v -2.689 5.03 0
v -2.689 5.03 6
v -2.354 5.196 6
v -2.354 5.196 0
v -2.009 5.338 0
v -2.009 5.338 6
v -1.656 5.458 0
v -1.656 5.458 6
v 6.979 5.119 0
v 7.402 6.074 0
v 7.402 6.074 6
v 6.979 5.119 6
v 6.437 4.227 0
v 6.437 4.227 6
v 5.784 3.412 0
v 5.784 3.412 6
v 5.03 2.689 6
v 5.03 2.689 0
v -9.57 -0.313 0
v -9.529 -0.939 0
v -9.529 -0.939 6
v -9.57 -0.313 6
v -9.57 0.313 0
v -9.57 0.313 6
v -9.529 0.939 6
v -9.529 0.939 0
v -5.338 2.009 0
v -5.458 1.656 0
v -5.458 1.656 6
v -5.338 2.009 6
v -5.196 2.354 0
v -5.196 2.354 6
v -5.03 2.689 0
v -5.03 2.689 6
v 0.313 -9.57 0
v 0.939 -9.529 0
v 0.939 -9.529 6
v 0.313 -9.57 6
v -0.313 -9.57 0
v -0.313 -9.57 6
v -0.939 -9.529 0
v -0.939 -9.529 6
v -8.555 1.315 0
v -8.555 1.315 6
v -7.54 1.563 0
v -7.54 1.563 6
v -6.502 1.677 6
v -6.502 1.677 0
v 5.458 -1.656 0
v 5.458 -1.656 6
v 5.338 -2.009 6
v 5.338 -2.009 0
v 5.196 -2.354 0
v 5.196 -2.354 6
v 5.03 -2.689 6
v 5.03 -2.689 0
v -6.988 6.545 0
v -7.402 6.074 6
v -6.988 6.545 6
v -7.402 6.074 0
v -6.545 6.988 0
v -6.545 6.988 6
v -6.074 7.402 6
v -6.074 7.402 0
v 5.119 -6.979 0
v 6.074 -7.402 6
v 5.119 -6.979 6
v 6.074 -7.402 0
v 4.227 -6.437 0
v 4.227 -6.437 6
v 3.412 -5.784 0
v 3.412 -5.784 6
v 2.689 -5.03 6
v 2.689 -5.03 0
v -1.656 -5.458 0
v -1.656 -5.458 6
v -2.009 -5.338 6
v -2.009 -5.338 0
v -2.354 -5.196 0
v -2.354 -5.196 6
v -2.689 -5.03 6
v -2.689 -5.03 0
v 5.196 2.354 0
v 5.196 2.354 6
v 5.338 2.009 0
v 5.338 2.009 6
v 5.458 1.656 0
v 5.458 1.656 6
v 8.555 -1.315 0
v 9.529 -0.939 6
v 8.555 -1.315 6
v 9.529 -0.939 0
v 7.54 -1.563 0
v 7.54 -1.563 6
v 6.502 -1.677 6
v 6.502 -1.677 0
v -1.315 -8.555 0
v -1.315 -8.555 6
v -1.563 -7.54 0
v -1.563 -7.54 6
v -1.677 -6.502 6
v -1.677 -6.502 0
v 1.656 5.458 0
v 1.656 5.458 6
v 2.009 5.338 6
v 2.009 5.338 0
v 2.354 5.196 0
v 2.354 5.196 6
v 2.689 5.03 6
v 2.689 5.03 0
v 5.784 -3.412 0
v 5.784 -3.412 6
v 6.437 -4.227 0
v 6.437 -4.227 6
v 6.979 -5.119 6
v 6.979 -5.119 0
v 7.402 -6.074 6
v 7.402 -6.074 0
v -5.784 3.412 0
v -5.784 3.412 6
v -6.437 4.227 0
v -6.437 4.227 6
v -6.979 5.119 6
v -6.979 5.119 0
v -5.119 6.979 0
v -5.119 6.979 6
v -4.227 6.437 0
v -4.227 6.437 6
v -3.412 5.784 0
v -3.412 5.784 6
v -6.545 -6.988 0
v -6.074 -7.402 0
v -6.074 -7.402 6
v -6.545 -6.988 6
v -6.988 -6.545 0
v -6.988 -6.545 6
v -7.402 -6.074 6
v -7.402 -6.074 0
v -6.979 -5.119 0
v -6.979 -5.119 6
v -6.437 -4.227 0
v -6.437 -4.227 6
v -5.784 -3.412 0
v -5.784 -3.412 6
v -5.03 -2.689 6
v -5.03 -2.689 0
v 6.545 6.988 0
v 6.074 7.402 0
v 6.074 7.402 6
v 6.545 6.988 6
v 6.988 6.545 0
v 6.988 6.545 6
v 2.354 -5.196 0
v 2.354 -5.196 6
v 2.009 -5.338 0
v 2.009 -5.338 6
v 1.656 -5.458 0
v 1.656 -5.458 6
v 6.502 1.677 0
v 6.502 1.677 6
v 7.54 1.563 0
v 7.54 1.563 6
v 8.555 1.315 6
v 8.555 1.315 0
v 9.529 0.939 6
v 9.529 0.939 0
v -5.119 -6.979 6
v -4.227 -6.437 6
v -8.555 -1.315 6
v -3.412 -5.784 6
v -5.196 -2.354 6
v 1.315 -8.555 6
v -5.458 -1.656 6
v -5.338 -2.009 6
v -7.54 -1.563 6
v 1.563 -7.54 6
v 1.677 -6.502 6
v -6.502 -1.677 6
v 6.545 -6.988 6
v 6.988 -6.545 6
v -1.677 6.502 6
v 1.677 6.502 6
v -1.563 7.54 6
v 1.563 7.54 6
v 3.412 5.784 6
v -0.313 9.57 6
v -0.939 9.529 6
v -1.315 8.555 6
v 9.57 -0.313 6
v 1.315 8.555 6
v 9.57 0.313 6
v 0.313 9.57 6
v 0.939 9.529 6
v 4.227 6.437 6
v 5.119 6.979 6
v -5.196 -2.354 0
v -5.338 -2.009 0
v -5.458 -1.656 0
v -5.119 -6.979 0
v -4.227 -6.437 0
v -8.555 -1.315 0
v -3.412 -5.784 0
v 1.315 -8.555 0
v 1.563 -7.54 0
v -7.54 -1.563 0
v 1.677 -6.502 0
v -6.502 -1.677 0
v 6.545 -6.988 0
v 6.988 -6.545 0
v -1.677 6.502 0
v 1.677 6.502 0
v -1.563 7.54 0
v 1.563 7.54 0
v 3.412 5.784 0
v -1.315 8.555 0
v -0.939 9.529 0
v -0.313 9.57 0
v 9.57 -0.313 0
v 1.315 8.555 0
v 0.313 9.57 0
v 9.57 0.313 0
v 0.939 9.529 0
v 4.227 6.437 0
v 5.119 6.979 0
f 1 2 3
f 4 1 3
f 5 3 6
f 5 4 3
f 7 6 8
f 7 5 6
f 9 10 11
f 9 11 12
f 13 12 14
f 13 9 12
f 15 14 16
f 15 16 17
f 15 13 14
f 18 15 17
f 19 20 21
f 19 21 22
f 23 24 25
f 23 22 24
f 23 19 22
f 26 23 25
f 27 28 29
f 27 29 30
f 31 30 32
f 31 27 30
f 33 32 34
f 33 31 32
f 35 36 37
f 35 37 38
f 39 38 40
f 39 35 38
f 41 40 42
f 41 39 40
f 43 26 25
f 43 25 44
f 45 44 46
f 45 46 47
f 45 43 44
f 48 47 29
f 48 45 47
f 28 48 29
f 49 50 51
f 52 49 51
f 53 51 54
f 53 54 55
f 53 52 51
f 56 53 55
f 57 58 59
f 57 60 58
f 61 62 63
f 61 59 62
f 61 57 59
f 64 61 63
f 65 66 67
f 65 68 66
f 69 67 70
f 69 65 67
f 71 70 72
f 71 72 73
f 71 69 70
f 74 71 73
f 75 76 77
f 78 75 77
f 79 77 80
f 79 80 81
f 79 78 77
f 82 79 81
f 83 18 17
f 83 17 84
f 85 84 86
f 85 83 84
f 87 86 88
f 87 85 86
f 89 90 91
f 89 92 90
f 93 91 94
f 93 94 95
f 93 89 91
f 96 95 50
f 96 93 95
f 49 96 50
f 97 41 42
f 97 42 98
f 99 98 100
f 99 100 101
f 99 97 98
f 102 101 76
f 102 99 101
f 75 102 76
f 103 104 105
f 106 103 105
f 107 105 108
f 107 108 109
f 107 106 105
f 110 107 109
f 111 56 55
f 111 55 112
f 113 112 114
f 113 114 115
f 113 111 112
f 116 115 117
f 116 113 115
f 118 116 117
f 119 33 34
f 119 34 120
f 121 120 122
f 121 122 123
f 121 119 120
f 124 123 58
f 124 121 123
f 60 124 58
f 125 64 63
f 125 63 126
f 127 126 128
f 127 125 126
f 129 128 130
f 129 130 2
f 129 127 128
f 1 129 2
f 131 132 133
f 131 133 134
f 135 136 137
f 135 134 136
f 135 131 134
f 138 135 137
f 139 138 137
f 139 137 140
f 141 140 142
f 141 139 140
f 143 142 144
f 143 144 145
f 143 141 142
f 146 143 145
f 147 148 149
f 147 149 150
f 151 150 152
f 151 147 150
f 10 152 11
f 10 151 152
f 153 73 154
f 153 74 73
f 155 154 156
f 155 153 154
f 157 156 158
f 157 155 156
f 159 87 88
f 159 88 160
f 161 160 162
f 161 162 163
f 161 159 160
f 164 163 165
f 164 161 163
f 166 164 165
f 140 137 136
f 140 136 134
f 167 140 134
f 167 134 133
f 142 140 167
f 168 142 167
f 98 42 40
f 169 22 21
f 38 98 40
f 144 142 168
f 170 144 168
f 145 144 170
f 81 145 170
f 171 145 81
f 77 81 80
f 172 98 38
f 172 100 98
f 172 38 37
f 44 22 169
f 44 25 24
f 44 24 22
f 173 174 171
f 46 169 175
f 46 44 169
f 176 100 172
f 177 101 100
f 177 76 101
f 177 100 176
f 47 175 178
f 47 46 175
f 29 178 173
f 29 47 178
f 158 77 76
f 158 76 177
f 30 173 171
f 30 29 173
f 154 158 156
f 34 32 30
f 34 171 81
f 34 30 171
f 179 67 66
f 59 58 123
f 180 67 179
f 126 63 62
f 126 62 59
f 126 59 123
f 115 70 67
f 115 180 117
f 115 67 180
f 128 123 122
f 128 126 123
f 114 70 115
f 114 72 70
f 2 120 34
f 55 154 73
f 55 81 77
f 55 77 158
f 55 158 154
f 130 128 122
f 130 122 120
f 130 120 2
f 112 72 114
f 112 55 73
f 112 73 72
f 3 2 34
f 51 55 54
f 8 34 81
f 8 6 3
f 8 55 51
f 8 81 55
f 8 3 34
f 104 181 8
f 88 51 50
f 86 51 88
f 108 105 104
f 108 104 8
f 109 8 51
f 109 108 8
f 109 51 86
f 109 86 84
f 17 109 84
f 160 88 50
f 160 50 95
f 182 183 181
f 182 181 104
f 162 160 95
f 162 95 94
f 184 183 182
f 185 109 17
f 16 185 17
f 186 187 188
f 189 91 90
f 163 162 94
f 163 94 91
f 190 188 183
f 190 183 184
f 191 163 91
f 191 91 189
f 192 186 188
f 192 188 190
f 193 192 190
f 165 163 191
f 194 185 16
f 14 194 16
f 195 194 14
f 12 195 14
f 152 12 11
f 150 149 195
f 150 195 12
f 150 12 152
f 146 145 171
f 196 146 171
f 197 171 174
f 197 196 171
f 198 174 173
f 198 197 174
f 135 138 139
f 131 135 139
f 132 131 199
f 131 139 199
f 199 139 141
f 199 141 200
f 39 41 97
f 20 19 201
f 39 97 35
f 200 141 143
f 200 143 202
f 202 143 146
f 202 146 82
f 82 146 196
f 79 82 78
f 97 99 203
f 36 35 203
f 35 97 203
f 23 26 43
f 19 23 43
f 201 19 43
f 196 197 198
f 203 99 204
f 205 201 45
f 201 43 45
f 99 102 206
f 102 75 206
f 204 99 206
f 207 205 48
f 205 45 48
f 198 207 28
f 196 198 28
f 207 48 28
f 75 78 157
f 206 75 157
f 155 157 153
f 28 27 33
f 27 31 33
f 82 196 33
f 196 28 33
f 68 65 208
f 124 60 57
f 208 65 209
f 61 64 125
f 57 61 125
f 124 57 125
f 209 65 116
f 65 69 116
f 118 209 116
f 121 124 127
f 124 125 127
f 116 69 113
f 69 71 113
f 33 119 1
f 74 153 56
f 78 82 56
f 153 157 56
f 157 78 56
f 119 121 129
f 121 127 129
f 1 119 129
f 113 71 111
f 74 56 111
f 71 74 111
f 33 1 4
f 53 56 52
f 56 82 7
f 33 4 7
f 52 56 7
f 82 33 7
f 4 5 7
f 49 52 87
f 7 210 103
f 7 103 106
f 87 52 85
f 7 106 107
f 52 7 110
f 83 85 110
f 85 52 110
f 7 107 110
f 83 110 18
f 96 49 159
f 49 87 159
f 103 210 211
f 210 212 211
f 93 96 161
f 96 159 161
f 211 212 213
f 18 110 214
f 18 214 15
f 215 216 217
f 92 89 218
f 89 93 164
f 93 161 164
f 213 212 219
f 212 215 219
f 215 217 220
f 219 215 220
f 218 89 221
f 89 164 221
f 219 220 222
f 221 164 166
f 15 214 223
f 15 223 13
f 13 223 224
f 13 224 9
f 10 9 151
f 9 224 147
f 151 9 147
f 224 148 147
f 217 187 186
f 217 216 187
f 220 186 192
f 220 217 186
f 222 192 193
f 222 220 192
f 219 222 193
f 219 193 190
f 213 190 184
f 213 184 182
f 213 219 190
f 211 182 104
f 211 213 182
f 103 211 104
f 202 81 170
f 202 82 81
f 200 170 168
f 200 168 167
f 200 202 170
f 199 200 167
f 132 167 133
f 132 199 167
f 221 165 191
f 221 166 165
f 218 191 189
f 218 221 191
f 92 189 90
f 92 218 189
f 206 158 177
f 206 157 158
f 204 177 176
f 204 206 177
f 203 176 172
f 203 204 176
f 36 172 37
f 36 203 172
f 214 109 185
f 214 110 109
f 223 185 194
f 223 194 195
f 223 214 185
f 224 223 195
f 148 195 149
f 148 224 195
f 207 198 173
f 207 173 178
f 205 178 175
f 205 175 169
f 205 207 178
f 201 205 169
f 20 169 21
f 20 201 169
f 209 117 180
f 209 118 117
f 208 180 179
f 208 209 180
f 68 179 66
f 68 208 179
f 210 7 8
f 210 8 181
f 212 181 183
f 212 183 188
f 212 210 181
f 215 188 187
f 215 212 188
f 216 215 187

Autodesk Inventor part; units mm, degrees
sketch "Sketch1" plane through (0, 0, 0) normal (0, 0, 1) x (1, 0, 0)
  circle A0 centre (0, 0) radius 9.575
  dimension "d0" = 19.15
extrude "Extrusion1" add sketch "Sketch1" along normal blind 6
ref_plane "Work Plane2" through (0, 0, 3) normal (0, 0, 1) x (1, 0, 0)
sketch "Sketch2" plane through (0, 0, 0) normal (0, 0, -1) x (-1, 0, 0)
  circle A0 centre (0, 0) radius 9.575 projected
  circle A1 centre (0, 0) radius 7
  dimension "d3" = 14
surface extrude "Pitch Diameter" sketch "Sketch2" against normal through all shown no curves A1
ref_plane "Work Plane8" through (0, 0, 0) normal (0.9238795, 0.3826834, 0) x (0, 0, 1)
ref_plane "Work Plane9" through (0, 0, 0) normal (1, 0, 0) x (0, 1, 0)
spur gear teeth "Spur Gear" teeth 8 pitch diameter 14 tip diameter 19.15 root diameter 11.408 face width 20 start plane through (0, 0, 0) normal (0, 0, -1) x (-1, 0, 0)
equation "\"d0\" = da_da"
equation "\"d3\" = da_d"
equation "\"d16\" = da_aw"
equation "\"d43\" = da_aw"
equation "\"d46\" = da_aw"
equation "\"da_da\" = 19.15"
equation "\"da_d\" = 14"
equation "\"da_aw\" = 36.7"
properties part number "Spur Gear2" material "Steel"
